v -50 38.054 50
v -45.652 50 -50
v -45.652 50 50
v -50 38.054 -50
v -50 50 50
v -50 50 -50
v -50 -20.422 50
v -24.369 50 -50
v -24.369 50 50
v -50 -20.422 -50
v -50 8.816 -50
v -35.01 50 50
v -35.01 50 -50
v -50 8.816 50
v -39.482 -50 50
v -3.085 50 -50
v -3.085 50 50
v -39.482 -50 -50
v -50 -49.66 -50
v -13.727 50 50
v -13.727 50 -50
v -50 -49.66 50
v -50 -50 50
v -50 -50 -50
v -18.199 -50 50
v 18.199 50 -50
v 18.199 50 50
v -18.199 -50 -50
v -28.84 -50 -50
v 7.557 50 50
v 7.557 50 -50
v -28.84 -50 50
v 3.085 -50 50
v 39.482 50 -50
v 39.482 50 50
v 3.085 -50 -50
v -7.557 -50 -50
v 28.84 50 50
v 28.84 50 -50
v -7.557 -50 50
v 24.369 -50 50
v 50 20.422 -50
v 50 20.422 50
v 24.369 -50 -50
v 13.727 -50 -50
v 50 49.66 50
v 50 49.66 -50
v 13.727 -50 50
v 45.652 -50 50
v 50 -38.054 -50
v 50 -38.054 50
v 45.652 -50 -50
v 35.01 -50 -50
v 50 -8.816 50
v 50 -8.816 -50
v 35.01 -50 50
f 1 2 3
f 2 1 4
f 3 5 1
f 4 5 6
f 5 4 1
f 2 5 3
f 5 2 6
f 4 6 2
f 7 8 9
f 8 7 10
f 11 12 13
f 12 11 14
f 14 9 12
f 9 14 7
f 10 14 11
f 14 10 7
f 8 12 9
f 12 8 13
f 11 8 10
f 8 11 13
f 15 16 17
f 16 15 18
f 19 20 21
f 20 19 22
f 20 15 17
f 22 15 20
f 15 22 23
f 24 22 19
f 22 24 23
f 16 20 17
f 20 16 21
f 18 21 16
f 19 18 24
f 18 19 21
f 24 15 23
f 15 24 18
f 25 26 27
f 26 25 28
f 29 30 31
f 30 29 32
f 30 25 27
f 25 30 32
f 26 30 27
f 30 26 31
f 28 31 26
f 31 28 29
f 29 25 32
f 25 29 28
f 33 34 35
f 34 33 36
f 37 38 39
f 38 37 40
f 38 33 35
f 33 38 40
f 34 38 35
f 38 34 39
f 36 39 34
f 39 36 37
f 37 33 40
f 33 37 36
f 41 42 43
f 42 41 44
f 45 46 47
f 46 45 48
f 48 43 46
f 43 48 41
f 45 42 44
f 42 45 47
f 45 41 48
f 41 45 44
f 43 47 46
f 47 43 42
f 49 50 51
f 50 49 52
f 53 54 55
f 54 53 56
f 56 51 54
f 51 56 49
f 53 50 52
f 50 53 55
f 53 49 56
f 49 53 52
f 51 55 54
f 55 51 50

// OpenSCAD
union(){
  // slice 1
  rotate(a=[0, 0, -20])
    intersection(){
      translate(v=[-90, 0, 0])
        translate(v=[0, -500, -500])
          cube(size=[10, 1000, 1000]);
      rotate(a=[0, 0, 20])
        translate(v=[-50, -50, -50])
          cube(size=[100, 100, 100]);
    }
  // slice 3
  rotate(a=[0, 0, -20])
    intersection(){
      translate(v=[-70, 0, 0])
        translate(v=[0, -500, -500])
          cube(size=[10, 1000, 1000]);
      rotate(a=[0, 0, 20])
        translate(v=[-50, -50, -50])
          cube(size=[100, 100, 100]);
    }
  // slice 5
  rotate(a=[0, 0, -20])
    intersection(){
      translate(v=[-50, 0, 0])
        translate(v=[0, -500, -500])
          cube(size=[10, 1000, 1000]);
      rotate(a=[0, 0, 20])
        translate(v=[-50, -50, -50])
          cube(size=[100, 100, 100]);
    }
  // slice 7
  rotate(a=[0, 0, -20])
    intersection(){
      translate(v=[-30, 0, 0])
        translate(v=[0, -500, -500])
          cube(size=[10, 1000, 1000]);
      rotate(a=[0, 0, 20])
        translate(v=[-50, -50, -50])
          cube(size=[100, 100, 100]);
    }
  // slice 9
  rotate(a=[0, 0, -20])
    intersection(){
      translate(v=[-10, 0, 0])
        translate(v=[0, -500, -500])
          cube(size=[10, 1000, 1000]);
      rotate(a=[0, 0, 20])
        translate(v=[-50, -50, -50])
          cube(size=[100, 100, 100]);
    }
  // slice 11
  rotate(a=[0, 0, -20])
    intersection(){
      translate(v=[10, 0, 0])
        translate(v=[0, -500, -500])
          cube(size=[10, 1000, 1000]);
      rotate(a=[0, 0, 20])
        translate(v=[-50, -50, -50])
          cube(size=[100, 100, 100]);
    }
  // slice 13
  rotate(a=[0, 0, -20])
    intersection(){
      translate(v=[30, 0, 0])
        translate(v=[0, -500, -500])
          cube(size=[10, 1000, 1000]);
      rotate(a=[0, 0, 20])
        translate(v=[-50, -50, -50])
          cube(size=[100, 100, 100]);
    }
  // slice 15
  rotate(a=[0, 0, -20])
    intersection(){
      translate(v=[50, 0, 0])
        translate(v=[0, -500, -500])
          cube(size=[10, 1000, 1000]);
      rotate(a=[0, 0, 20])
        translate(v=[-50, -50, -50])
          cube(size=[100, 100, 100]);
    }
  // slice 17
  rotate(a=[0, 0, -20])
    intersection(){
      translate(v=[70, 0, 0])
        translate(v=[0, -500, -500])
          cube(size=[10, 1000, 1000]);
      rotate(a=[0, 0, 20])
        translate(v=[-50, -50, -50])
          cube(size=[100, 100, 100]);
    }
  // slice 19
  rotate(a=[0, 0, -20])
    intersection(){
      translate(v=[90, 0, 0])
        translate(v=[0, -500, -500])
          cube(size=[10, 1000, 1000]);
      rotate(a=[0, 0, 20])
        translate(v=[-50, -50, -50])
          cube(size=[100, 100, 100]);
    }
}
